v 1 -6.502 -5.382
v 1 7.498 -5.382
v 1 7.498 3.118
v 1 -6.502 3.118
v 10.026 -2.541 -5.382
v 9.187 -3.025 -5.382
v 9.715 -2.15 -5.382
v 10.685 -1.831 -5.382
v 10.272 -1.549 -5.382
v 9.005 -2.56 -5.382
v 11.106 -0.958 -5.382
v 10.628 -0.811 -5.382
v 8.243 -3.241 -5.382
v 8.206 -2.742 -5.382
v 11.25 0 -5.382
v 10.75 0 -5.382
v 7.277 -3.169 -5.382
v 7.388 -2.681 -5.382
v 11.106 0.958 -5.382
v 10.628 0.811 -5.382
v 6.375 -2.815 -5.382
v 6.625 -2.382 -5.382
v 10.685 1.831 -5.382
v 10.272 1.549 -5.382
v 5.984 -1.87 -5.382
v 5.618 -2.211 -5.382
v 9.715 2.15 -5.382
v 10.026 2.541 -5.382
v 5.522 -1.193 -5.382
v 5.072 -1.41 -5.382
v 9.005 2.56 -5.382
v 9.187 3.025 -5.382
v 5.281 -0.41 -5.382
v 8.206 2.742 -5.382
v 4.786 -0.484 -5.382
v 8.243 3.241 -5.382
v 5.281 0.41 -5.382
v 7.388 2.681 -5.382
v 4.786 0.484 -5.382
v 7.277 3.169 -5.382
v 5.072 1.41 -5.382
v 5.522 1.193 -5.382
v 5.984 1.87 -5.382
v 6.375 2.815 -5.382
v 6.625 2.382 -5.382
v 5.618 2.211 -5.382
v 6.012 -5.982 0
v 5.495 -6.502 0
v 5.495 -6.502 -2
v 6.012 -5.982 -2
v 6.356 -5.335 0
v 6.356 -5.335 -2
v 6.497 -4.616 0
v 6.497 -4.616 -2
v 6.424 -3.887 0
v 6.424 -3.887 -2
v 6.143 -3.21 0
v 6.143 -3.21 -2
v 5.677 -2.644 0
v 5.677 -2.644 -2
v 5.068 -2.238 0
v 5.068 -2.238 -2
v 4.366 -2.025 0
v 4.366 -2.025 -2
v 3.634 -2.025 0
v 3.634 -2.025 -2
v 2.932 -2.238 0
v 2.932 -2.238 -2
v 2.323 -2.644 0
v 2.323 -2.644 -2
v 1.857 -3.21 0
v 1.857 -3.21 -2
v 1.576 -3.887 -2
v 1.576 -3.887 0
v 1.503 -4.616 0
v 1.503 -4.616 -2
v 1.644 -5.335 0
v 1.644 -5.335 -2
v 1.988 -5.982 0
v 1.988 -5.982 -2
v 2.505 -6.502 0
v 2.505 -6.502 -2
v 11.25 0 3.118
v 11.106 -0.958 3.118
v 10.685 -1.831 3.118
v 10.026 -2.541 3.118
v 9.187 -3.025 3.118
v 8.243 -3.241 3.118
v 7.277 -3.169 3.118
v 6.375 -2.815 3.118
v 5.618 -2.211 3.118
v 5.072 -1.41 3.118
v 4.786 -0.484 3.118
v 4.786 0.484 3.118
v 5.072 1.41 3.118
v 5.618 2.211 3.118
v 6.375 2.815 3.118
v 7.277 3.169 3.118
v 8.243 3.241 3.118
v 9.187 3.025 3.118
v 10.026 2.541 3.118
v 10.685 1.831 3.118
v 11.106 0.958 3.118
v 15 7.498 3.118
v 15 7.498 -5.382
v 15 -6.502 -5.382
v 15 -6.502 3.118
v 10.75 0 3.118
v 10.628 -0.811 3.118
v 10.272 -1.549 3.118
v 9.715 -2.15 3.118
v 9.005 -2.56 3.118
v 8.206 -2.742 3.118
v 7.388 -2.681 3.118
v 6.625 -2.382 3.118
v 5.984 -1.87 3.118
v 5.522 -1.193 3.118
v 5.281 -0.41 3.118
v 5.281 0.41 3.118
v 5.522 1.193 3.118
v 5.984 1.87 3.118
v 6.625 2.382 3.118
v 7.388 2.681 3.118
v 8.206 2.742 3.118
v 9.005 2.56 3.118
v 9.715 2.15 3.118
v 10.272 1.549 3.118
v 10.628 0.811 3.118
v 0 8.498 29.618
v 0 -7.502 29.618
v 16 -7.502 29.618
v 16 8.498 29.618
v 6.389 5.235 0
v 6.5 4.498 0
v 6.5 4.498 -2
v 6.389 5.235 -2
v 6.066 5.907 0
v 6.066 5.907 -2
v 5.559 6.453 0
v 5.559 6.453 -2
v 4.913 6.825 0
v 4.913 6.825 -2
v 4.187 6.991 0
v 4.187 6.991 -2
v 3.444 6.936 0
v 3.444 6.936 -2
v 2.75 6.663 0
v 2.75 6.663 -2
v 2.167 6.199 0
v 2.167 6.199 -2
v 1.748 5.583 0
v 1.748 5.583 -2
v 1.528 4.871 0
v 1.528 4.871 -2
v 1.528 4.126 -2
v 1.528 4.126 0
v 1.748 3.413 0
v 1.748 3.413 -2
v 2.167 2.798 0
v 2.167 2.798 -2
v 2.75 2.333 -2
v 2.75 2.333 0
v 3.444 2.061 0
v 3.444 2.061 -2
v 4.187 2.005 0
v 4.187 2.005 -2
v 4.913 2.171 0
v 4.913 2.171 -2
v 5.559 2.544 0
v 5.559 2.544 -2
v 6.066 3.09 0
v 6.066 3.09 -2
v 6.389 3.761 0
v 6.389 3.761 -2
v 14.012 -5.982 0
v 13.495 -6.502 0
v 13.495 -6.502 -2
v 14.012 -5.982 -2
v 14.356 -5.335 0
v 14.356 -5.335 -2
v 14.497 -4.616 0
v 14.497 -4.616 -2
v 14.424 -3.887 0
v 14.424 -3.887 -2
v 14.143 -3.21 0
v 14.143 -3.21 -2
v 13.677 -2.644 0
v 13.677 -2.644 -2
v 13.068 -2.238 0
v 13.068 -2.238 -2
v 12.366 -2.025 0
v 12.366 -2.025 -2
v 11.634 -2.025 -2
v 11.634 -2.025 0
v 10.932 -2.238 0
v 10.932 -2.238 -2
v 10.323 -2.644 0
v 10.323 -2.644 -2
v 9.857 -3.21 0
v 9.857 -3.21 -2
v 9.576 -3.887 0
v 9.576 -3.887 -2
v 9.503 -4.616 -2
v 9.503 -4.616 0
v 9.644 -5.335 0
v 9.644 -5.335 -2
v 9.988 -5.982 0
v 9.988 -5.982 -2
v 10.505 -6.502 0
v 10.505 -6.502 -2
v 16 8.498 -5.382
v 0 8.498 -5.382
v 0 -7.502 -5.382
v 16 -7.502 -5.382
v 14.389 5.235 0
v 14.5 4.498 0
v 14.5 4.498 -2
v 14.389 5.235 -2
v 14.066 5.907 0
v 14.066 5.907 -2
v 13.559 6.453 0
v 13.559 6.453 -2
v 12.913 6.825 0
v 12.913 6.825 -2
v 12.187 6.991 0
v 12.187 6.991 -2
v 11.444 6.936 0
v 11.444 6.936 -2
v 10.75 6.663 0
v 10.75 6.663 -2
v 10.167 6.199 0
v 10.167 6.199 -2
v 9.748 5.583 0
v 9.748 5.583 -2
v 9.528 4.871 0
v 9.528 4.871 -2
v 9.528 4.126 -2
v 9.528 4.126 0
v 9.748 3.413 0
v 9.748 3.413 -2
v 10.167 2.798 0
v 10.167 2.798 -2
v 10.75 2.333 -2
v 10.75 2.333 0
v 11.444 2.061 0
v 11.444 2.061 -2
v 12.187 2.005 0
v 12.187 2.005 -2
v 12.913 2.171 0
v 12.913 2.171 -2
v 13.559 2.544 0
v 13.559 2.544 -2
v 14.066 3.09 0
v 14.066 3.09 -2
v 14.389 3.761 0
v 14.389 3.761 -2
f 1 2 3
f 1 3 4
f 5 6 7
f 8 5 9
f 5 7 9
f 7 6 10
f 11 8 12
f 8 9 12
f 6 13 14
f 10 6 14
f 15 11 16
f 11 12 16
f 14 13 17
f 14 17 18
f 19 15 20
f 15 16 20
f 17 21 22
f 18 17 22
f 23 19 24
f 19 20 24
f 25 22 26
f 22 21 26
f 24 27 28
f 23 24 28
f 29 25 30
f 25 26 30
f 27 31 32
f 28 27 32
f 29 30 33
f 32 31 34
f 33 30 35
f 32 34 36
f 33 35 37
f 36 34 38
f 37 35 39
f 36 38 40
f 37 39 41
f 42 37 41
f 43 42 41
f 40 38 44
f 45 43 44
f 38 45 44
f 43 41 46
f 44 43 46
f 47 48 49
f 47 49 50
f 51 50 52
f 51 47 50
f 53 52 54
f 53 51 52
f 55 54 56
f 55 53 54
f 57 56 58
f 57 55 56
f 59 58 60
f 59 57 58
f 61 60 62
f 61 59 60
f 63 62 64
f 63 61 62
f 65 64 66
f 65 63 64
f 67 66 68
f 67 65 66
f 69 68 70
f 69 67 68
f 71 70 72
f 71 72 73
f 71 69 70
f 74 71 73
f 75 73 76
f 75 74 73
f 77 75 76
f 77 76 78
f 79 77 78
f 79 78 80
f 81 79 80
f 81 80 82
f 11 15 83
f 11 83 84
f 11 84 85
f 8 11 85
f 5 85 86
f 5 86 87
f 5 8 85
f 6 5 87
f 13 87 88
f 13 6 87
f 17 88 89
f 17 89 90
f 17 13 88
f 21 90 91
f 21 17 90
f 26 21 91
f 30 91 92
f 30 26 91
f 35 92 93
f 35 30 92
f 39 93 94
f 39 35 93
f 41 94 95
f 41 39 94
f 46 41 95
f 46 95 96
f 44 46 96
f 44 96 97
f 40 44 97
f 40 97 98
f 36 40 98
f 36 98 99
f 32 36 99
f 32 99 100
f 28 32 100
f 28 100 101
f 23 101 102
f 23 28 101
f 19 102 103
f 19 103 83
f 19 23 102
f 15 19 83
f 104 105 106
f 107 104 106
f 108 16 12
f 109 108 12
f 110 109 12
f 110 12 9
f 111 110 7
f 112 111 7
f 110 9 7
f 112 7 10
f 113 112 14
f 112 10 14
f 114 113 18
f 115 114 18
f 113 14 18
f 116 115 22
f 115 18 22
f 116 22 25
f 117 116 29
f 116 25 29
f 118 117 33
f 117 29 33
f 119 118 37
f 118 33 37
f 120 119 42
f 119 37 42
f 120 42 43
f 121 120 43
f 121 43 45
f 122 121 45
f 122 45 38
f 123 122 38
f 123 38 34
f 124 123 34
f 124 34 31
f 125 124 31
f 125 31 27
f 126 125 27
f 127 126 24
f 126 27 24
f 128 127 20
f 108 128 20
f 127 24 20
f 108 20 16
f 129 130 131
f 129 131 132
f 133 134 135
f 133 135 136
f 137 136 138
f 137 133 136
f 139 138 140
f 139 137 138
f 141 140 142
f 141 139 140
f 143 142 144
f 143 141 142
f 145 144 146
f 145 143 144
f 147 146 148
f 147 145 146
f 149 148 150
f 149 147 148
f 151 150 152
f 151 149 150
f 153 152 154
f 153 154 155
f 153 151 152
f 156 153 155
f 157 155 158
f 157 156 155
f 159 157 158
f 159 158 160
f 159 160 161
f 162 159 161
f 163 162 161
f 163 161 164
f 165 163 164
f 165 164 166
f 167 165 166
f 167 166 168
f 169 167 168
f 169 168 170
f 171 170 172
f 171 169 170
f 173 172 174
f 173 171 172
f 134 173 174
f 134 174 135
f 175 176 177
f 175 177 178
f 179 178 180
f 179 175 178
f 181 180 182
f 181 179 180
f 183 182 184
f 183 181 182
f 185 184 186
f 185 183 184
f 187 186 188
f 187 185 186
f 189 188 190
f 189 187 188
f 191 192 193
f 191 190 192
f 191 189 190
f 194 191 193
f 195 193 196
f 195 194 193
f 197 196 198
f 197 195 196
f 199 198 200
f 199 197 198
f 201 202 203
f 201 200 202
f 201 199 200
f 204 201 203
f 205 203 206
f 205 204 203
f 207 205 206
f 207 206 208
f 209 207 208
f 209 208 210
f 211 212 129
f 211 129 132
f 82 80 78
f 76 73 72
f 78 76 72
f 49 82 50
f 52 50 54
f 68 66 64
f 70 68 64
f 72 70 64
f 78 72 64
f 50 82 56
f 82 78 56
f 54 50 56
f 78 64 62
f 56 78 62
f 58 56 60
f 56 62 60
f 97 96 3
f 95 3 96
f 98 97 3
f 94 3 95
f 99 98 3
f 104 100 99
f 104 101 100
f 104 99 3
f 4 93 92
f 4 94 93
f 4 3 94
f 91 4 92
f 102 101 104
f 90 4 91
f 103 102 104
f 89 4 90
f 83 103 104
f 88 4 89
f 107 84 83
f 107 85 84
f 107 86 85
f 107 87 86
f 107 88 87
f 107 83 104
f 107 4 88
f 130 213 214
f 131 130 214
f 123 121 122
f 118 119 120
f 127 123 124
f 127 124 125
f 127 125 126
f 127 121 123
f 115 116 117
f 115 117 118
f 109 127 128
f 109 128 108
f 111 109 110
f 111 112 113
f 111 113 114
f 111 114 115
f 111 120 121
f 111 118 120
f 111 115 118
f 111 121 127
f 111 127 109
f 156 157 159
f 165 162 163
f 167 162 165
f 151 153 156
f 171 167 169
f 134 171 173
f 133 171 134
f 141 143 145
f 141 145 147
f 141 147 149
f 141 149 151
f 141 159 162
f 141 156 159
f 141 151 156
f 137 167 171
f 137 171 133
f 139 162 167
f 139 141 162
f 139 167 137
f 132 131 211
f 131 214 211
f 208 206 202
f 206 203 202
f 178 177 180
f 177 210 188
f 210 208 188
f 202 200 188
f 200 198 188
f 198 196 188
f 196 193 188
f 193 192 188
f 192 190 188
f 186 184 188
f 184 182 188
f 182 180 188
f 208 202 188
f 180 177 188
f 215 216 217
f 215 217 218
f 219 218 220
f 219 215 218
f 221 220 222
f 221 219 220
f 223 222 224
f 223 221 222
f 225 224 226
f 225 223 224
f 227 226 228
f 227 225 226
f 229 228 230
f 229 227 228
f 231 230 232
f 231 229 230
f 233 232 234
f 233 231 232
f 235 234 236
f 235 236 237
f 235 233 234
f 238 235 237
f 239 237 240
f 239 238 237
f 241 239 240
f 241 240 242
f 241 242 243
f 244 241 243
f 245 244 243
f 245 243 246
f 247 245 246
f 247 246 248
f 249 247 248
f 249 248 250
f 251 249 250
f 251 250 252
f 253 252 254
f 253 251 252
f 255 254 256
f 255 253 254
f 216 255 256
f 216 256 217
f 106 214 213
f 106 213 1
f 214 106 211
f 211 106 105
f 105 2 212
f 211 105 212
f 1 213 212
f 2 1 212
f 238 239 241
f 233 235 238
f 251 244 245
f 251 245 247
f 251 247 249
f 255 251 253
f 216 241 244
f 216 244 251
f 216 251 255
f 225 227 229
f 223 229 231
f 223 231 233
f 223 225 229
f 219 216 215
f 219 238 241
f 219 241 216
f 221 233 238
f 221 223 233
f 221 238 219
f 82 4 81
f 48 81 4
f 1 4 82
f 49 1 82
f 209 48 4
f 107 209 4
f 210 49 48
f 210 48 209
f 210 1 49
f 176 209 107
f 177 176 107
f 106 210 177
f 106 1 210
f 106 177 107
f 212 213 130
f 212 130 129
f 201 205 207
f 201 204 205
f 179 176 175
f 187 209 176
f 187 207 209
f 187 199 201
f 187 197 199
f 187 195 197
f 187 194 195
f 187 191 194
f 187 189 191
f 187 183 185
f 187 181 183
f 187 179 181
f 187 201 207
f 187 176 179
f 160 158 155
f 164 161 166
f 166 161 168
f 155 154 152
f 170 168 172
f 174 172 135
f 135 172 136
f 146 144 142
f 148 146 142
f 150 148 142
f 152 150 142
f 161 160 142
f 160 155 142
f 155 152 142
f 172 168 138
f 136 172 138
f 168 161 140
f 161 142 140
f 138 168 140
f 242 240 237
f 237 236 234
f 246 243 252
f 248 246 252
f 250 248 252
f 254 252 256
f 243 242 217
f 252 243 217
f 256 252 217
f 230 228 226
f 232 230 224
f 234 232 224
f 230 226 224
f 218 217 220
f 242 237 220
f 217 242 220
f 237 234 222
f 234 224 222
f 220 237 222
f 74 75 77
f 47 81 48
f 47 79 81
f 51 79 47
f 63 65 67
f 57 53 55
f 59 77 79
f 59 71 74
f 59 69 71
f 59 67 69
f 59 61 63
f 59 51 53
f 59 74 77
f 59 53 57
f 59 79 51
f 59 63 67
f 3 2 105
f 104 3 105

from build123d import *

# Parameters (mm, degrees)
F0_W     = 16
F0_H     = 10
F1_DEPTH = 16
F2_W     = 14
F2_H     = 14
F2_R     = 3.25
F2_R_2   = 2.75
F3_DEPTH = 8.5
F5_DEPTH = 25
F4_R     = 2.5
F6_DEPTH = 2


# Not quite as in the source:
# - a feature names something its author has since deleted; it is built from what else it names


with BuildPart() as f1:
    # F0 (on Right) → F1 (new body)
    with BuildSketch(Plane.YZ):
        with Locations((0.4982002154, -0.3821941838)):
            Rectangle(F0_W, F0_H)
    extrude(amount=F1_DEPTH)

    # F2 (on face) → F3 (cut)
    with BuildSketch(Plane(origin=(0, 0, -5.3821941838), x_dir=(1, 0, 0), z_dir=(0, 0, -1))):
        with Locations((8, -0.4982002154)):
            Rectangle(F2_W, F2_H)
        with Locations((8, 0)):
            Circle(F2_R, mode=Mode.SUBTRACT)
        with Locations((8, 0)):
            Circle(F2_R_2)
    extrude(amount=-F3_DEPTH, mode=Mode.SUBTRACT)

    # F5 (add): a face of the model
    f5_faces = [f1.faces().sort_by_distance(p)[0] for p in [
        (8, 0.4982002154, 4.6178058162),
    ]]
    extrude(f5_faces, amount=F5_DEPTH)

    # F4 (on Top) → F6, piece 3 (join)
    with BuildSketch(Plane.XY):
        with Locations((4, -4.4982002154)):
            Circle(F4_R)
        with Locations((12, -4.4982002154)):
            Circle(F4_R)
    extrude(amount=-F6_DEPTH)


with BuildPart() as f6:
    # F4 (on Top) → F6 (new body)
    with BuildSketch(Plane.XY):
        with Locations((4, 4.4982002154)):
            Circle(F4_R)
    extrude(amount=-F6_DEPTH)


with BuildPart() as f6b:
    # F4 (on Top) → F6, piece 2 (new body)
    with BuildSketch(Plane.XY):
        with Locations((12, 4.4982002154)):
            Circle(F4_R)
    extrude(amount=-F6_DEPTH)


solid = Compound([f1.part, f6.part, f6b.part])
